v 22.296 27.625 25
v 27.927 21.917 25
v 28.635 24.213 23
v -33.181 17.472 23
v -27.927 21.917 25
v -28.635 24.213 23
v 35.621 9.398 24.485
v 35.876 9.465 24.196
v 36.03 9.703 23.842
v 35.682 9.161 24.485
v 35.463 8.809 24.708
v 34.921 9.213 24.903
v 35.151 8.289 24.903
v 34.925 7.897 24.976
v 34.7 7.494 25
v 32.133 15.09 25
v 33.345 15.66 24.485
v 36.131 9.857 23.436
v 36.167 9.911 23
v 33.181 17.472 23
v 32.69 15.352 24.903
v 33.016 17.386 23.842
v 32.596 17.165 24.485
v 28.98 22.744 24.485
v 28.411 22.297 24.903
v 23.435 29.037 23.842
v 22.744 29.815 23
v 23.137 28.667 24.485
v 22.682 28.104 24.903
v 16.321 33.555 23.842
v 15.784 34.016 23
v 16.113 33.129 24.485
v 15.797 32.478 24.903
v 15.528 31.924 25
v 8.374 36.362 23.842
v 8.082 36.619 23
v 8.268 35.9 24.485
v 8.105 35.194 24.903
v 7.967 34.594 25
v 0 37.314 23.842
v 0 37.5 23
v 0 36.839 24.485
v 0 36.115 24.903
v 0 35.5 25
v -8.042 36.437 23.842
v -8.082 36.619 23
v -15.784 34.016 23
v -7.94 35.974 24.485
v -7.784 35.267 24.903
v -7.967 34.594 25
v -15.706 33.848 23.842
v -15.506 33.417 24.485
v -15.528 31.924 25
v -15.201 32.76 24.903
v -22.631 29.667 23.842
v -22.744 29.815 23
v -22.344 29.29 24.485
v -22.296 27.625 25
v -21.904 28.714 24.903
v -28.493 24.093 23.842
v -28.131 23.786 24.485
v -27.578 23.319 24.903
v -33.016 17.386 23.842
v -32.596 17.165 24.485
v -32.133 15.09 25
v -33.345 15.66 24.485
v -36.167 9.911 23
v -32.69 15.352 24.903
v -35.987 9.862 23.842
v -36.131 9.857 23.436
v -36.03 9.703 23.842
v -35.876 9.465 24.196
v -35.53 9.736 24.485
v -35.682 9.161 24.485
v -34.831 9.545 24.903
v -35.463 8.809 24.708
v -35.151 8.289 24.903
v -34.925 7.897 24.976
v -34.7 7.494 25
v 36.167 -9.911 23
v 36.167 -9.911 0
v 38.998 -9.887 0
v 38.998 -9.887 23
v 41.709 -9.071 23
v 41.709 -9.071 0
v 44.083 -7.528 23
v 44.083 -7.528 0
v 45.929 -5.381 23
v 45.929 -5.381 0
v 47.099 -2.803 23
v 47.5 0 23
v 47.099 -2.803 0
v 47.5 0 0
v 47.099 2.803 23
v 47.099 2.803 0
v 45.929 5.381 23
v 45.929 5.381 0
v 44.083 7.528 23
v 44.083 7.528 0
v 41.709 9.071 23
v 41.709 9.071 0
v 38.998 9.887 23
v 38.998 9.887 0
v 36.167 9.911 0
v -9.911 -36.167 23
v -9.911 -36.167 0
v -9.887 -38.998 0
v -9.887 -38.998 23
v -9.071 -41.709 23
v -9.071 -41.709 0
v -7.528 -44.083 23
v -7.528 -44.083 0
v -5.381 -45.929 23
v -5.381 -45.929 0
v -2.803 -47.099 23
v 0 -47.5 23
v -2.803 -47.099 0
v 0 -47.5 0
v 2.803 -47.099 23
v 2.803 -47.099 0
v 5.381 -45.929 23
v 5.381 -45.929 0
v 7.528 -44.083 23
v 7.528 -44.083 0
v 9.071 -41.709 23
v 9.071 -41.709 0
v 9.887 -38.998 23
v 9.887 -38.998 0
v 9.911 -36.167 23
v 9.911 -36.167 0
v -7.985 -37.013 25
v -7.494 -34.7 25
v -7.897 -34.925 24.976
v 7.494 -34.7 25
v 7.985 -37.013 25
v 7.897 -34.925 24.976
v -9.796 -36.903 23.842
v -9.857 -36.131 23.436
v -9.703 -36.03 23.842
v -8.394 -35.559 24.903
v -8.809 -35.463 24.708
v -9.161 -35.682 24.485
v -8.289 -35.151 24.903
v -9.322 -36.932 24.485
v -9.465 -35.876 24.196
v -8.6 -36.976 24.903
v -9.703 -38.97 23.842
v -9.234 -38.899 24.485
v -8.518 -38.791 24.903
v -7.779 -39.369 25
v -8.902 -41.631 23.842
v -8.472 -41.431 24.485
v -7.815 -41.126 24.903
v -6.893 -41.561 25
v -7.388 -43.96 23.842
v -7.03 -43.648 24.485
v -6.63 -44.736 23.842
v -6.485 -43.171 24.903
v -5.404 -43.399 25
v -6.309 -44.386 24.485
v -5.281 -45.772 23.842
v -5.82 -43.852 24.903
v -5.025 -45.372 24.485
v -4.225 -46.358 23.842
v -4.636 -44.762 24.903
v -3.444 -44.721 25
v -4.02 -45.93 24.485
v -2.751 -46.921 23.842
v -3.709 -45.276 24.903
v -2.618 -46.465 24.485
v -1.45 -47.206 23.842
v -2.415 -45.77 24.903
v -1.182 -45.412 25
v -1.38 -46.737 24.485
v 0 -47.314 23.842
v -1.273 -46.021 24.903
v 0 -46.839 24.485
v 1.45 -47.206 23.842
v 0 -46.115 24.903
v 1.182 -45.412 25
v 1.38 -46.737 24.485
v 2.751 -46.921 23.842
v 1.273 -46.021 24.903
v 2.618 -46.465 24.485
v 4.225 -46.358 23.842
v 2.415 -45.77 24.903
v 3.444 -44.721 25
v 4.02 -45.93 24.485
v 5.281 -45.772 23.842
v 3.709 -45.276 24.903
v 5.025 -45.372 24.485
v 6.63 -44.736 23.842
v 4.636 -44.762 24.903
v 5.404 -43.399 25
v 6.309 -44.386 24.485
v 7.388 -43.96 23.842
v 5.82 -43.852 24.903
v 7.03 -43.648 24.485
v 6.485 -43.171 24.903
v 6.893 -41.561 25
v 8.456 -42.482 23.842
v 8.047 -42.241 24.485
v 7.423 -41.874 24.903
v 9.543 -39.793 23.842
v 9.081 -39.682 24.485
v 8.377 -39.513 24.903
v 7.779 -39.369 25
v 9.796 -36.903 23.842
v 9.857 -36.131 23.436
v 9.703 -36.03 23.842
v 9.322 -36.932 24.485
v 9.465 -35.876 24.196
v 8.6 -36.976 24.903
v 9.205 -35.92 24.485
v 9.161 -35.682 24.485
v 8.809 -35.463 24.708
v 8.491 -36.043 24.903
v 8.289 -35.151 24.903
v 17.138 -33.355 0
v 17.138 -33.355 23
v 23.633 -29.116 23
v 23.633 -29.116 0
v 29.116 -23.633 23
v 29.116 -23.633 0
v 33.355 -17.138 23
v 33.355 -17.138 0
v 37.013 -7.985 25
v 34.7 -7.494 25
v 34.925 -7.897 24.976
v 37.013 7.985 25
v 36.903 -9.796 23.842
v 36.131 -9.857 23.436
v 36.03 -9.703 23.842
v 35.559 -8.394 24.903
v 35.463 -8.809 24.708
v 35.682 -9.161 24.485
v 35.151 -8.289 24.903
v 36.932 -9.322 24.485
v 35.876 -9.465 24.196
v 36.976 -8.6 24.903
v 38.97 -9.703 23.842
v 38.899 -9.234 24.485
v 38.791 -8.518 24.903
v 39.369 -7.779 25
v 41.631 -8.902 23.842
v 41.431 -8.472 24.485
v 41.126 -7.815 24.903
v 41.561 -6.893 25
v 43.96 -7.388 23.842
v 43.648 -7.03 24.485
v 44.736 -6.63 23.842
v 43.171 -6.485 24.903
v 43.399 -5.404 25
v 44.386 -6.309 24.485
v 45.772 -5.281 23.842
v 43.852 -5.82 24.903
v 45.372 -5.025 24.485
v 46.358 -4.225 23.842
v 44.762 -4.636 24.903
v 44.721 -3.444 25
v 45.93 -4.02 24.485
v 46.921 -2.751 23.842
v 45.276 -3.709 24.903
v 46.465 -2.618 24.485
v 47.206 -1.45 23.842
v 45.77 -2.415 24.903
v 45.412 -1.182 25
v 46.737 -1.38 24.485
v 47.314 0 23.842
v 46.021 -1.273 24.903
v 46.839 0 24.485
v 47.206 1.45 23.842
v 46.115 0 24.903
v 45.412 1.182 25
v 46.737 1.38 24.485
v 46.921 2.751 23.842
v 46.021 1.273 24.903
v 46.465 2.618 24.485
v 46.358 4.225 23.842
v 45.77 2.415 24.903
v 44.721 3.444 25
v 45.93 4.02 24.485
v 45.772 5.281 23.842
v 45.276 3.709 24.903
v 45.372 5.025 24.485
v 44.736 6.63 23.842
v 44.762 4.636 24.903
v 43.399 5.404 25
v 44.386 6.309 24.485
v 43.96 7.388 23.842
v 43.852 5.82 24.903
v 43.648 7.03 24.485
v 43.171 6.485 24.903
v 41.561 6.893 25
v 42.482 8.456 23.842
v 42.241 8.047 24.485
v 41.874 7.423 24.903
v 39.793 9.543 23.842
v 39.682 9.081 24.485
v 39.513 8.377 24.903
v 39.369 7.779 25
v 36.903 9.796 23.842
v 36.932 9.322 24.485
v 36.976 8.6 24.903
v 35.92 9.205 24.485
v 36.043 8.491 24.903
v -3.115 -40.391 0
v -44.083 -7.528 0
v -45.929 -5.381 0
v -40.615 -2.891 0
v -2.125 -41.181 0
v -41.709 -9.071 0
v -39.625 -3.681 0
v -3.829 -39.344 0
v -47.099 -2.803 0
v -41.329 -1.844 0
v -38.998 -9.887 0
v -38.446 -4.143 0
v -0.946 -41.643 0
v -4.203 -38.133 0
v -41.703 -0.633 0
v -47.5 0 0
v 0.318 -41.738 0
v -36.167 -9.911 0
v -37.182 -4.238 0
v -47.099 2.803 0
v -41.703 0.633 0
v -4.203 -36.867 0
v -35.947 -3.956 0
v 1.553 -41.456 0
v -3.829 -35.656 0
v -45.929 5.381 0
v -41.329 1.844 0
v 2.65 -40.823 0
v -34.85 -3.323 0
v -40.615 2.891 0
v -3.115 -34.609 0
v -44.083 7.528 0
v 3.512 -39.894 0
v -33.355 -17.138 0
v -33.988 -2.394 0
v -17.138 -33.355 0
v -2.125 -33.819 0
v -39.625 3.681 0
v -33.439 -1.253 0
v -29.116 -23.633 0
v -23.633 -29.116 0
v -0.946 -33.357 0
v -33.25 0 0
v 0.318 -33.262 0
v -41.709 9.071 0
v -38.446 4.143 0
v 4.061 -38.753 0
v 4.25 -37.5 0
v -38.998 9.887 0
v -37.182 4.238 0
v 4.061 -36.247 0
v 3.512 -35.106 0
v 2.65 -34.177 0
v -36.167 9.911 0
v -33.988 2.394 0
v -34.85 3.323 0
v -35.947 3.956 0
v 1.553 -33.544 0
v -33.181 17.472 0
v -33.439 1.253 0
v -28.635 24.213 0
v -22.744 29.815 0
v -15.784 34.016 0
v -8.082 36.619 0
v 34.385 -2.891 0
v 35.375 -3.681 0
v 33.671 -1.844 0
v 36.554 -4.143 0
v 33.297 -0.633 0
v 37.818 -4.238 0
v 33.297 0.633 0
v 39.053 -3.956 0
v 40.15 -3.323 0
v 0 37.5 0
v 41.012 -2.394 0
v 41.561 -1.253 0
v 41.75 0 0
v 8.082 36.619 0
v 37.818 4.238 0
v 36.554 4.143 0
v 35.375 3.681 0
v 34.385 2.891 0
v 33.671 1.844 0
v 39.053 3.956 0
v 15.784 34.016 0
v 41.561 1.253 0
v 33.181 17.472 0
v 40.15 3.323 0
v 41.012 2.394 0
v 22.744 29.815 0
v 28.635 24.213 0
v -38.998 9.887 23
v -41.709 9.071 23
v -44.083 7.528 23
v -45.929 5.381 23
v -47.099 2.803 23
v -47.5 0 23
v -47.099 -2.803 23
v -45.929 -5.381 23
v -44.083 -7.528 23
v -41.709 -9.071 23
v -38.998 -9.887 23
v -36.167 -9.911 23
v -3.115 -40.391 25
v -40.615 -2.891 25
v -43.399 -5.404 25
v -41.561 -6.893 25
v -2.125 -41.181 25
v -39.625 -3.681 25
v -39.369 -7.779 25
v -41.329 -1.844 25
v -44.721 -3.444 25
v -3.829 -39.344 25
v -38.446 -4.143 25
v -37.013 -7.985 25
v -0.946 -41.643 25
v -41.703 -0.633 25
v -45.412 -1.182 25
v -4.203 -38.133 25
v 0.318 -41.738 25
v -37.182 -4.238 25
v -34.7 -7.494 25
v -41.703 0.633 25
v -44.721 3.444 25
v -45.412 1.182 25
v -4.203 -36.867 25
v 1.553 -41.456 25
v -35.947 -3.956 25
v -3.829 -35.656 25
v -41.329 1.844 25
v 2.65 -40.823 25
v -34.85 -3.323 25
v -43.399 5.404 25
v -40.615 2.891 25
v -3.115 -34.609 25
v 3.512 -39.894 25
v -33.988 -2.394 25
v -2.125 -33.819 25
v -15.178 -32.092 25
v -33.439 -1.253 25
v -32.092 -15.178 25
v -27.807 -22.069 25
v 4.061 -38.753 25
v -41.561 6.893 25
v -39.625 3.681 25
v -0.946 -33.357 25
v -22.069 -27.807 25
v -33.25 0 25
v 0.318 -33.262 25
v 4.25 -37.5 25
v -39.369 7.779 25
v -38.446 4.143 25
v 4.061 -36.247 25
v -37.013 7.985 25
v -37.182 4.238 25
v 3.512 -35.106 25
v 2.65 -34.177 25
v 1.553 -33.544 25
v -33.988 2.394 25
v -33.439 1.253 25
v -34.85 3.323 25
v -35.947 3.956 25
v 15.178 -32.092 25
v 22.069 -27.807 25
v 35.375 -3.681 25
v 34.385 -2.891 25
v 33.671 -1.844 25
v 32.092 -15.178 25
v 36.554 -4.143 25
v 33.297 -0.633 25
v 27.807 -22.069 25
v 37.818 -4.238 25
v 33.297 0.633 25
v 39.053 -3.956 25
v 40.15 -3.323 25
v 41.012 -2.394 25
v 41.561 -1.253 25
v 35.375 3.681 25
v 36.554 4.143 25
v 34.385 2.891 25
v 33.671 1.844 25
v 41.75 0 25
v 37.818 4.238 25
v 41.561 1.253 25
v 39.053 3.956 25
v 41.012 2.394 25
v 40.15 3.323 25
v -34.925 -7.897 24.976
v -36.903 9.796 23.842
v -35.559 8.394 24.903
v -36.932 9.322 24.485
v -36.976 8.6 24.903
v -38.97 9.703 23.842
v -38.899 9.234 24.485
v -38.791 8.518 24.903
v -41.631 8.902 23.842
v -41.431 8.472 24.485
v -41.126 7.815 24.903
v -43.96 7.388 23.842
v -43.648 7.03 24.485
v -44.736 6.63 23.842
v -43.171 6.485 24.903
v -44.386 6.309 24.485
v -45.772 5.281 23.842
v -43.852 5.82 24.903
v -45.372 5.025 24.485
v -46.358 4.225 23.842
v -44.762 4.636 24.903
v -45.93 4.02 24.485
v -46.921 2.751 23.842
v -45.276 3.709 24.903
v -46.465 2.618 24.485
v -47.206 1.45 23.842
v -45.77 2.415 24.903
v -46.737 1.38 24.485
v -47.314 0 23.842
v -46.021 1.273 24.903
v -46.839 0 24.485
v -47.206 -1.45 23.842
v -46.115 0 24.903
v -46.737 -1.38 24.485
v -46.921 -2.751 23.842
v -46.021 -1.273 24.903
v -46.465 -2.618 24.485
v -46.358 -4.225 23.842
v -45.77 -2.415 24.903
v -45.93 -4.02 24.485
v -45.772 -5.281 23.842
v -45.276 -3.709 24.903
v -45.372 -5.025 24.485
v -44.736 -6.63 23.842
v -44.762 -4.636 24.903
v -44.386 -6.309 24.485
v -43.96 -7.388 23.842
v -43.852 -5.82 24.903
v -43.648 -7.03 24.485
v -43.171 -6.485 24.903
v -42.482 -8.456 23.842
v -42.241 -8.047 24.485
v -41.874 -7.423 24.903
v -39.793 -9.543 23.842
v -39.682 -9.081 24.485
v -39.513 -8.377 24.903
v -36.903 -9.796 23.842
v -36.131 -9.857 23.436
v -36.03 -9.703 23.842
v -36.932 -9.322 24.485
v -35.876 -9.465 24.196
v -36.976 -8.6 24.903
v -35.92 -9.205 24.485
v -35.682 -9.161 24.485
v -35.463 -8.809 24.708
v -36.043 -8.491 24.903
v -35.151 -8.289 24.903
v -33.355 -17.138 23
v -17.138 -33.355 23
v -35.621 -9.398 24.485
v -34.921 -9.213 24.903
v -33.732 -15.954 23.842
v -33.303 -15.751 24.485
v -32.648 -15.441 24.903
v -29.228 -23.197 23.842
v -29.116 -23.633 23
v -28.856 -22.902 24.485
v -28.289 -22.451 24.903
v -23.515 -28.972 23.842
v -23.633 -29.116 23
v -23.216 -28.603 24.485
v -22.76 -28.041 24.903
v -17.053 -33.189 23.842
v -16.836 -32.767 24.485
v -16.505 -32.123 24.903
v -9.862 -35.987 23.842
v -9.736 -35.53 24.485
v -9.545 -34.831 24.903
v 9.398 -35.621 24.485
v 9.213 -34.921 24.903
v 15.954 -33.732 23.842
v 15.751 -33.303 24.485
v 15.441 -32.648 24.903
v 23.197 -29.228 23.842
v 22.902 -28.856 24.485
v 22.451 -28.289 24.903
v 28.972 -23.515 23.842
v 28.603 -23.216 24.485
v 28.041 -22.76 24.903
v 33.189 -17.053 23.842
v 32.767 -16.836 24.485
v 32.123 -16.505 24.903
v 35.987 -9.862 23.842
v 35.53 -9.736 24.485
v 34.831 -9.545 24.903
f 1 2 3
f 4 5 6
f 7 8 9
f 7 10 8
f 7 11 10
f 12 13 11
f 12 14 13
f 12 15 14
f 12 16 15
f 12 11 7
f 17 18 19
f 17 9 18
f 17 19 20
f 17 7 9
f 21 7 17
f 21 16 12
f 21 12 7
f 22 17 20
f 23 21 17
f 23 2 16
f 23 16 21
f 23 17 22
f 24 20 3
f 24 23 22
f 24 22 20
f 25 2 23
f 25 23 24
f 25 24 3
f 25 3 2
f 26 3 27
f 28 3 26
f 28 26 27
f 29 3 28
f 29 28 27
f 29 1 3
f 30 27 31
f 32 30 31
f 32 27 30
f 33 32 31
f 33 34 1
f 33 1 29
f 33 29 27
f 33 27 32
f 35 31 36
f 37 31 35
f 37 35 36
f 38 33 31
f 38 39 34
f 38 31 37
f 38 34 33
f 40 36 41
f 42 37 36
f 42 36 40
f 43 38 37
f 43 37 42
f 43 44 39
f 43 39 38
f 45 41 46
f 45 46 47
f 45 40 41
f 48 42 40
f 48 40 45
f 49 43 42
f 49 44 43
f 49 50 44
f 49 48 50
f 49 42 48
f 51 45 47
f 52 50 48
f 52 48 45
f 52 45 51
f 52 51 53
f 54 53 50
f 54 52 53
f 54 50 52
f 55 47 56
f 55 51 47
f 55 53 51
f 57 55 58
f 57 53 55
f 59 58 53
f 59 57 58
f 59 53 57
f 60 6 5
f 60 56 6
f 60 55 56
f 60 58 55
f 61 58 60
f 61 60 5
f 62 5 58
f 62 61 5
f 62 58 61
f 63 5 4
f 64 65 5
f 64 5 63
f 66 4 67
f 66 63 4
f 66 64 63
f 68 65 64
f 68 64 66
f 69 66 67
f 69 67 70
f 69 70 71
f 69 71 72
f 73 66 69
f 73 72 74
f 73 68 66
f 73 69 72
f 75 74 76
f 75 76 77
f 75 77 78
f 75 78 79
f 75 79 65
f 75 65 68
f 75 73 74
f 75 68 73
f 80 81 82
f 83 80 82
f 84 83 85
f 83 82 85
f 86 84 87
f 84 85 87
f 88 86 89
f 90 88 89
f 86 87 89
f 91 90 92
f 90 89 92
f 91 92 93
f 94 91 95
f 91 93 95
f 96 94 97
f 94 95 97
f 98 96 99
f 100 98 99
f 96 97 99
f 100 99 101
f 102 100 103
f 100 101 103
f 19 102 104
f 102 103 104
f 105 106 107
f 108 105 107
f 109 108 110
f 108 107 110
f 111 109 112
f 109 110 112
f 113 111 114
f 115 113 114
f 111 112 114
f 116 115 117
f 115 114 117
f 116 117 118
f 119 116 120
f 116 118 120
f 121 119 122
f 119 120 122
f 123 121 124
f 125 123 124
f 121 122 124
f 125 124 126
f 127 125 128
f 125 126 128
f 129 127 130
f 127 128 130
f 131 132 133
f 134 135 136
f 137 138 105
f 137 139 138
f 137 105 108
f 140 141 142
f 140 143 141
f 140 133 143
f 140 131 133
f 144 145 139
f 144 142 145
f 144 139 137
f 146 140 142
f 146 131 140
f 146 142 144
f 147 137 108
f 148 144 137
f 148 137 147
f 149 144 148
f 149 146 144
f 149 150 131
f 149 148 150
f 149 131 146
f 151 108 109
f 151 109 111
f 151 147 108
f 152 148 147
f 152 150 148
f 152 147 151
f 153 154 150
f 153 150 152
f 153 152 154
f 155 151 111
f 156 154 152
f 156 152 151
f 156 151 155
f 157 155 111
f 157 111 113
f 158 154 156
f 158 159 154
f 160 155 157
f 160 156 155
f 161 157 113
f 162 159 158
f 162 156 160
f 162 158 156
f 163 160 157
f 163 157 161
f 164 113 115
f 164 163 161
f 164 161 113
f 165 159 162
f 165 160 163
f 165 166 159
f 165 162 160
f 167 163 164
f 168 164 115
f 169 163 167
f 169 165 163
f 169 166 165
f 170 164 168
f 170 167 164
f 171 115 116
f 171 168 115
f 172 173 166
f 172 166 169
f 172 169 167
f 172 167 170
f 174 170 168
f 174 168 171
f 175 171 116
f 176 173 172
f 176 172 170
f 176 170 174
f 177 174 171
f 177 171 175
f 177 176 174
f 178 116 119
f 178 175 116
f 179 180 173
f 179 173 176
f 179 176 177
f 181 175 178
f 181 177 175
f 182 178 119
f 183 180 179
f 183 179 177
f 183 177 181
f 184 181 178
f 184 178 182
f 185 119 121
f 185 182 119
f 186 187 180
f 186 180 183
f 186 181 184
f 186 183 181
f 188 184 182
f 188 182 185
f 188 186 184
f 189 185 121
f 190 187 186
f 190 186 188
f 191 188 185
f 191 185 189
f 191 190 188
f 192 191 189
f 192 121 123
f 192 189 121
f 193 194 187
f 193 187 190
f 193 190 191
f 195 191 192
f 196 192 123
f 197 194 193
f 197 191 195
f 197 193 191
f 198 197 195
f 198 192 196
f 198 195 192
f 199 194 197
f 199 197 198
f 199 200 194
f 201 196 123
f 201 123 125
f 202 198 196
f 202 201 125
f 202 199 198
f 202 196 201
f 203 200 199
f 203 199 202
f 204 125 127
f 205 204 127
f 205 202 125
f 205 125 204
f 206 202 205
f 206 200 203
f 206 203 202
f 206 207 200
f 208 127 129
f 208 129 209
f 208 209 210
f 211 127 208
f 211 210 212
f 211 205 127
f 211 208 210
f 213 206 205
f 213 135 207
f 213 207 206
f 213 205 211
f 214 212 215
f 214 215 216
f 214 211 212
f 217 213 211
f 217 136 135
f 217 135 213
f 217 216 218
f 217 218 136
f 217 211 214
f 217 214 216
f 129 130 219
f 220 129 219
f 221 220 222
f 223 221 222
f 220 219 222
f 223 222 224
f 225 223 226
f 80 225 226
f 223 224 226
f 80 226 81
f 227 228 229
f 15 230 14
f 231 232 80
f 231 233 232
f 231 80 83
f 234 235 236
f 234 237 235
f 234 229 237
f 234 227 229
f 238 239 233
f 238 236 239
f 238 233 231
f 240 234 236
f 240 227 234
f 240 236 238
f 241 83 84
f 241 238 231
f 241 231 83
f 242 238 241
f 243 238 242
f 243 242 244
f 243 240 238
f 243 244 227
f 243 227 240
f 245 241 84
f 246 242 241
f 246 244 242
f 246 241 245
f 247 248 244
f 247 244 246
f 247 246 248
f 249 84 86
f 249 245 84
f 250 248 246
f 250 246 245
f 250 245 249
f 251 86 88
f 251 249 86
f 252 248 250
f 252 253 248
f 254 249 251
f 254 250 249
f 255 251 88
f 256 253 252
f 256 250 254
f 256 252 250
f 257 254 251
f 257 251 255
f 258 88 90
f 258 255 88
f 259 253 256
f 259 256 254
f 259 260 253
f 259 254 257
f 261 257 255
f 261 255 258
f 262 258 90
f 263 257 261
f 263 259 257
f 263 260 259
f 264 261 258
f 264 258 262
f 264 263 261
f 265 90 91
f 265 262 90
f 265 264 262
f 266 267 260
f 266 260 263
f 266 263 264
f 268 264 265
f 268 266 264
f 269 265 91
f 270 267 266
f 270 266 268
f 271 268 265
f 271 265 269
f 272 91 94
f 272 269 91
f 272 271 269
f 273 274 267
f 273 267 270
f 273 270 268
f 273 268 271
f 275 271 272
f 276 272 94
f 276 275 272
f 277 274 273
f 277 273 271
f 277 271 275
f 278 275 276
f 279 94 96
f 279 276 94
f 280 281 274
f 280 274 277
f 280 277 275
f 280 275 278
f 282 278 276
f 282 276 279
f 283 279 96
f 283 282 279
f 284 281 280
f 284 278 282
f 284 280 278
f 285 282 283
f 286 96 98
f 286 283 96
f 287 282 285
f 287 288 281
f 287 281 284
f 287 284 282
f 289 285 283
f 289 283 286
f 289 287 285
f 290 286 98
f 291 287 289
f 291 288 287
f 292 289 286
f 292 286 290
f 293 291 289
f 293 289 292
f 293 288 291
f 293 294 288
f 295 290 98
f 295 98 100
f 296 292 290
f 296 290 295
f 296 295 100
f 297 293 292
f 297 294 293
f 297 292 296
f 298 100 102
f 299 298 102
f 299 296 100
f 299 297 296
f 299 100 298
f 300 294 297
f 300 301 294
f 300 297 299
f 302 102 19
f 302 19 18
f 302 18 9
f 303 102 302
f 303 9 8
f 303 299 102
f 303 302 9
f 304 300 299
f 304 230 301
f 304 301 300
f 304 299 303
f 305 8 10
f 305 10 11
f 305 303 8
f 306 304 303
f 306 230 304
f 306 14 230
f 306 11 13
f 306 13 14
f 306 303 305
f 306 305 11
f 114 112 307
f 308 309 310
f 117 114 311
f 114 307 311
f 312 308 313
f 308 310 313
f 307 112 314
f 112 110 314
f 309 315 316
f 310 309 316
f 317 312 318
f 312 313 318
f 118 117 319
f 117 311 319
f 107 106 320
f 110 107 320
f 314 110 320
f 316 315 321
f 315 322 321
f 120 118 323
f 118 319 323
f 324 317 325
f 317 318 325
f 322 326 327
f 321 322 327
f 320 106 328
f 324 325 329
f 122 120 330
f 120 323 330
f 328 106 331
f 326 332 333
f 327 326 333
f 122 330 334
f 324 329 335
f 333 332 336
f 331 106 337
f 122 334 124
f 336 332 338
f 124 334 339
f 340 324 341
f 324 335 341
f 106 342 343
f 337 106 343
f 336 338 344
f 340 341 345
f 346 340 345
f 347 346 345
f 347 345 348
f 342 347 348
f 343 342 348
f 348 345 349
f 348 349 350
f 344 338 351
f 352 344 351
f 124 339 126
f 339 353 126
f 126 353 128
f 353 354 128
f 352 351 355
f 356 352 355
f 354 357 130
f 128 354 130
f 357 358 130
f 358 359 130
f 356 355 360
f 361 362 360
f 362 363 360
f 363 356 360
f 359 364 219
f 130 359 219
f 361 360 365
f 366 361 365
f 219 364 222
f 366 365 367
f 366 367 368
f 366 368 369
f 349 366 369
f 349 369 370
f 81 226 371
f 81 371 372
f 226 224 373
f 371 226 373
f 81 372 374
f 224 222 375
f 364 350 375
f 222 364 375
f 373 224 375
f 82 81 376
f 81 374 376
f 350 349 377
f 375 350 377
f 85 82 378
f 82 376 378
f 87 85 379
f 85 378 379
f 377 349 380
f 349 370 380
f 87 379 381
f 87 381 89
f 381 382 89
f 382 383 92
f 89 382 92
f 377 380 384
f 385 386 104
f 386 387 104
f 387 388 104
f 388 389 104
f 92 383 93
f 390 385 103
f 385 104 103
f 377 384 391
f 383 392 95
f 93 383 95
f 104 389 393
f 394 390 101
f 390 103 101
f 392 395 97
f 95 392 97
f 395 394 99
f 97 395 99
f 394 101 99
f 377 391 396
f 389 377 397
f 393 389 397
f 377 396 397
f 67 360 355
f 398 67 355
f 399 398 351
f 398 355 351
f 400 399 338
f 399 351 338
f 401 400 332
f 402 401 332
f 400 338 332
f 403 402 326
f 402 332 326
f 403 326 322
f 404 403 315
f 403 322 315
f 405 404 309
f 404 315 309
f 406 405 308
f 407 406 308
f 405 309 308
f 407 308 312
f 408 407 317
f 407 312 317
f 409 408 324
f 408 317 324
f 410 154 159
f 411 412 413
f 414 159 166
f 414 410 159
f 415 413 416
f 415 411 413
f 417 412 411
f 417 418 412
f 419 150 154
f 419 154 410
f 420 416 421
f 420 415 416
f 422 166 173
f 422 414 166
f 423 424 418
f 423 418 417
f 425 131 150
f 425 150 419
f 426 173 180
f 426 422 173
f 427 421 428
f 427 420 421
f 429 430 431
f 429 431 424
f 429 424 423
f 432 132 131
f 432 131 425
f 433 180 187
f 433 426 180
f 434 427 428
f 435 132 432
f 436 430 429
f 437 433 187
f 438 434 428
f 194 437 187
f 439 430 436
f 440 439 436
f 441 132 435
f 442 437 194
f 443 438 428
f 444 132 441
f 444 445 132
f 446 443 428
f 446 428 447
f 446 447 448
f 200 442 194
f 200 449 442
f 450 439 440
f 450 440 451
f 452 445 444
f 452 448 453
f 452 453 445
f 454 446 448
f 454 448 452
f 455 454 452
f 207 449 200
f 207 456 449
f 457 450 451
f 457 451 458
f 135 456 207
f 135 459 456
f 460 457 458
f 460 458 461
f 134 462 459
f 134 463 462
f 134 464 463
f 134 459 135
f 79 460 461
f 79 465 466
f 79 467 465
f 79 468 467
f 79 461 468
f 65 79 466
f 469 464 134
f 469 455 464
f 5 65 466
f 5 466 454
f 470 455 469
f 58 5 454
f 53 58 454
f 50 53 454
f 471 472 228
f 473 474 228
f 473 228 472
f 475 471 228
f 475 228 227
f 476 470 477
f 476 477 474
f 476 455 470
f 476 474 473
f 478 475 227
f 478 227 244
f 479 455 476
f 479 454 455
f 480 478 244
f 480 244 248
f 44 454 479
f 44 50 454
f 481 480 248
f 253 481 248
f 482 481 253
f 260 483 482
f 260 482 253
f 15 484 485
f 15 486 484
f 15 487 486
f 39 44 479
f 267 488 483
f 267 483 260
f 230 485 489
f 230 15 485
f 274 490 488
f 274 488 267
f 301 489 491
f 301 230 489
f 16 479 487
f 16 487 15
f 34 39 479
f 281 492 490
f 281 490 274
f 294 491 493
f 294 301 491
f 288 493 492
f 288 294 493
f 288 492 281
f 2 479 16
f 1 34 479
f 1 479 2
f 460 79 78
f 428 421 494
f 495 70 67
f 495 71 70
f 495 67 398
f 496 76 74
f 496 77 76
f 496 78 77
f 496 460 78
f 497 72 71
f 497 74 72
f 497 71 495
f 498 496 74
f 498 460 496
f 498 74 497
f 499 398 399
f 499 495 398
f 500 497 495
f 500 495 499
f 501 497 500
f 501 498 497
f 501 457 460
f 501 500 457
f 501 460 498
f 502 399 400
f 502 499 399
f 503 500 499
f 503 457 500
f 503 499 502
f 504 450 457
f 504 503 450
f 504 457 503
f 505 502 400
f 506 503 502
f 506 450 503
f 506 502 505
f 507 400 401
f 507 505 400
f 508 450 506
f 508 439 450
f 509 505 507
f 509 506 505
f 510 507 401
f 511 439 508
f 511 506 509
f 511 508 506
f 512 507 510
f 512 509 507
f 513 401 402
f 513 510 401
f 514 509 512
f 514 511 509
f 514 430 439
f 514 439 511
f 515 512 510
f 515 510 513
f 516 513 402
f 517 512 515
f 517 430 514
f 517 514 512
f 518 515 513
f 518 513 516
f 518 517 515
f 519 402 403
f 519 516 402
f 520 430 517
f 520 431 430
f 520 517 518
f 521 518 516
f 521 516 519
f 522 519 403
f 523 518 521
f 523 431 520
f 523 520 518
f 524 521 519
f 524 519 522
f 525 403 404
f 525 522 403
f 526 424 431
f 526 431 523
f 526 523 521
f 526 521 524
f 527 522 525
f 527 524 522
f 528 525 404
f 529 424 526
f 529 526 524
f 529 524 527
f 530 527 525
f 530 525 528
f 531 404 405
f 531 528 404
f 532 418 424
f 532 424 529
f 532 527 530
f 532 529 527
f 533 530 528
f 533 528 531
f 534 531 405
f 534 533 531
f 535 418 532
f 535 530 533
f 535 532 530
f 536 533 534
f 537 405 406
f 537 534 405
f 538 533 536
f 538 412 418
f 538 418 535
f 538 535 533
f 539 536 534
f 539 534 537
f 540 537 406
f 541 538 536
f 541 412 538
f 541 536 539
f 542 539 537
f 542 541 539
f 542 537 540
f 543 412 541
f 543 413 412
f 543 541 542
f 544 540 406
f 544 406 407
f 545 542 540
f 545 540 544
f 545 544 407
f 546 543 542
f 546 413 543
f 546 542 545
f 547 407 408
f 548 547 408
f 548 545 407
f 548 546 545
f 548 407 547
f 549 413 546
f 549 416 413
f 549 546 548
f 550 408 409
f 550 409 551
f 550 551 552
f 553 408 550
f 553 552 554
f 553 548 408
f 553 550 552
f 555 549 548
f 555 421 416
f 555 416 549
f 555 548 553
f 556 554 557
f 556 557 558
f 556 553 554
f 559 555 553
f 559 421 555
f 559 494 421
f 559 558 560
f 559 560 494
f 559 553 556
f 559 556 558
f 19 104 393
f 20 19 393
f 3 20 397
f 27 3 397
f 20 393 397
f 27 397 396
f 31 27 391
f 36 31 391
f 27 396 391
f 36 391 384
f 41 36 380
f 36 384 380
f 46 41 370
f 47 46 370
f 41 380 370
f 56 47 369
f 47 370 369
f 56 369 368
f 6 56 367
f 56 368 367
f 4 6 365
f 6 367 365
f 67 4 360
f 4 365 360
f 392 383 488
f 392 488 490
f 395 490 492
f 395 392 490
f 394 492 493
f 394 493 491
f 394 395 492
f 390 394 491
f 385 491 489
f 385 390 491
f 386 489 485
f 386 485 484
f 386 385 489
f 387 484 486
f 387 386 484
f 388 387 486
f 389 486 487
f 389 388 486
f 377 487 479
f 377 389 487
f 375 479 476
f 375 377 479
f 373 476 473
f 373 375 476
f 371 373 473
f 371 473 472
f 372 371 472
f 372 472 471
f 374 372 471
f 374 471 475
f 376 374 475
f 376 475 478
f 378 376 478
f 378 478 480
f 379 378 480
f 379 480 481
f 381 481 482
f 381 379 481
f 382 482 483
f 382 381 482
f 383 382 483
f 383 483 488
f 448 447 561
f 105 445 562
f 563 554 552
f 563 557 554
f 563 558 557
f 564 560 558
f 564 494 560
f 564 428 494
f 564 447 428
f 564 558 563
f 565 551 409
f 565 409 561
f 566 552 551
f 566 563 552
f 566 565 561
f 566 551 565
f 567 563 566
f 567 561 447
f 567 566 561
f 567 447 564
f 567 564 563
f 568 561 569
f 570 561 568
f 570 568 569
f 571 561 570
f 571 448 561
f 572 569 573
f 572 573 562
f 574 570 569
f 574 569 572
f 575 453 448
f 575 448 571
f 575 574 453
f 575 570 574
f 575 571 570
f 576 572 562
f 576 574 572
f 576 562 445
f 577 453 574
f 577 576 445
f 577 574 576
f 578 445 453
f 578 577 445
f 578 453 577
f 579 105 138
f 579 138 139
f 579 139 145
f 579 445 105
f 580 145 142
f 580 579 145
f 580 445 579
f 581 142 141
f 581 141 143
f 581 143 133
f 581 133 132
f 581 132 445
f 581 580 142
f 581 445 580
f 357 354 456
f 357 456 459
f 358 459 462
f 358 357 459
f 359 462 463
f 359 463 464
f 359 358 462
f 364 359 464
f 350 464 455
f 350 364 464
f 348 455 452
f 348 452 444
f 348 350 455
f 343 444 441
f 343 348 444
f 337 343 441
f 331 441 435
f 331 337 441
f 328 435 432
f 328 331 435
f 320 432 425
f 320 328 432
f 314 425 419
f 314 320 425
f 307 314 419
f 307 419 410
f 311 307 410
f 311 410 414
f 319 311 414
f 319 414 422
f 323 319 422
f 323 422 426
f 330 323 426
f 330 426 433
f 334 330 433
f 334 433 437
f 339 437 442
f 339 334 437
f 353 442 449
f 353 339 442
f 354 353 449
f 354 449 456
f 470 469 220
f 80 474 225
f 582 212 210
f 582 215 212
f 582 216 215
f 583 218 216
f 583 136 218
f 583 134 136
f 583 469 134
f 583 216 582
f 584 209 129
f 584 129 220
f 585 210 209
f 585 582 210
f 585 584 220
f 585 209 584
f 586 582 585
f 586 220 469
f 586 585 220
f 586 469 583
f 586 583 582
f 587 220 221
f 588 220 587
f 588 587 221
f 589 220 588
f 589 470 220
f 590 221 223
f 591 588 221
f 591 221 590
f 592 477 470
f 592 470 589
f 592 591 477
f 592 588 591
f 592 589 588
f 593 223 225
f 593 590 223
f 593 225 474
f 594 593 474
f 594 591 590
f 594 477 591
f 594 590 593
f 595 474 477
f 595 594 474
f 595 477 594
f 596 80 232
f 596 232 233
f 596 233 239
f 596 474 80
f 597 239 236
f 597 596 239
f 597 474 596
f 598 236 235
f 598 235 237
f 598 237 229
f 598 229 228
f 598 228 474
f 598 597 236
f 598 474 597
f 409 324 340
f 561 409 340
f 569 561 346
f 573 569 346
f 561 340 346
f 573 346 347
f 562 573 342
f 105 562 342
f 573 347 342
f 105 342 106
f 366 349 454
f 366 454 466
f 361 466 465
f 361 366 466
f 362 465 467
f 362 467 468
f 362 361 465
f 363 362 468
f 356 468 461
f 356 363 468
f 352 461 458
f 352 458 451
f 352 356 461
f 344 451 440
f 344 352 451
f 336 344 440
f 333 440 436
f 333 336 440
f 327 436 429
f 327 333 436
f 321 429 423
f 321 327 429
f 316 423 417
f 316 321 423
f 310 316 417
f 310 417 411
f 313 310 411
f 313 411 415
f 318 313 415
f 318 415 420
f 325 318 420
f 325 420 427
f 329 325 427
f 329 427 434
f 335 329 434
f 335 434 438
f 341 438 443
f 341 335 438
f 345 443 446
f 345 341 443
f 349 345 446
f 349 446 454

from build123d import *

# Parameters (mm, degrees)
F0_R     = 4.25
F1_DEPTH = 25
F3_R     = 2


# Not quite as in the source:
# - a feature of the source that left no trace in its solid (it failed there, or was rolled back) is left out


with BuildPart() as f1:
    # F0 (on Top) → F1 (new body)
    with BuildSketch(Plane.XY):
        with BuildLine():
            ThreePointArc((36.1666666667, -9.9107124982), (47.5, 0), (36.1666666667, 9.9107124982))
            ThreePointArc((36.1666666667, 9.9107124982), (0, 37.5), (-36.1666666667, 9.9107124982))
            ThreePointArc((-36.1666666667, 9.9107124982), (-47.5, 0), (-36.1666666667, -9.9107124982))
            ThreePointArc((-36.1666666667, -9.9107124982), (-26.5165042945, -26.5165042945), (-9.9107124982, -36.1666666667))
            ThreePointArc((-9.9107124982, -36.1666666667), (0, -47.5), (9.9107124982, -36.1666666667))
            ThreePointArc((9.9107124982, -36.1666666667), (26.5165042945, -26.5165042945), (36.1666666667, -9.9107124982))
        make_face()
        with Locations((0, -37.5)):
            Circle(F0_R, mode=Mode.SUBTRACT)
        with Locations((-37.5, 0)):
            Circle(F0_R, mode=Mode.SUBTRACT)
        with Locations((37.5, 0)):
            Circle(F0_R, mode=Mode.SUBTRACT)
    extrude(amount=F1_DEPTH)

    # F3
    f3_edges = [f1.edges().sort_by_distance(p)[0] for p in [
        (0, -47.5, 25),
        (26.516504, -26.516504, 25),
        (47.5, 0, 25),
        (0, 37.5, 25),
        (-47.5, 0, 25),
        (-26.516504, -26.516504, 25),
    ]]
    fillet(f3_edges, radius=F3_R)


solid = f1.part
